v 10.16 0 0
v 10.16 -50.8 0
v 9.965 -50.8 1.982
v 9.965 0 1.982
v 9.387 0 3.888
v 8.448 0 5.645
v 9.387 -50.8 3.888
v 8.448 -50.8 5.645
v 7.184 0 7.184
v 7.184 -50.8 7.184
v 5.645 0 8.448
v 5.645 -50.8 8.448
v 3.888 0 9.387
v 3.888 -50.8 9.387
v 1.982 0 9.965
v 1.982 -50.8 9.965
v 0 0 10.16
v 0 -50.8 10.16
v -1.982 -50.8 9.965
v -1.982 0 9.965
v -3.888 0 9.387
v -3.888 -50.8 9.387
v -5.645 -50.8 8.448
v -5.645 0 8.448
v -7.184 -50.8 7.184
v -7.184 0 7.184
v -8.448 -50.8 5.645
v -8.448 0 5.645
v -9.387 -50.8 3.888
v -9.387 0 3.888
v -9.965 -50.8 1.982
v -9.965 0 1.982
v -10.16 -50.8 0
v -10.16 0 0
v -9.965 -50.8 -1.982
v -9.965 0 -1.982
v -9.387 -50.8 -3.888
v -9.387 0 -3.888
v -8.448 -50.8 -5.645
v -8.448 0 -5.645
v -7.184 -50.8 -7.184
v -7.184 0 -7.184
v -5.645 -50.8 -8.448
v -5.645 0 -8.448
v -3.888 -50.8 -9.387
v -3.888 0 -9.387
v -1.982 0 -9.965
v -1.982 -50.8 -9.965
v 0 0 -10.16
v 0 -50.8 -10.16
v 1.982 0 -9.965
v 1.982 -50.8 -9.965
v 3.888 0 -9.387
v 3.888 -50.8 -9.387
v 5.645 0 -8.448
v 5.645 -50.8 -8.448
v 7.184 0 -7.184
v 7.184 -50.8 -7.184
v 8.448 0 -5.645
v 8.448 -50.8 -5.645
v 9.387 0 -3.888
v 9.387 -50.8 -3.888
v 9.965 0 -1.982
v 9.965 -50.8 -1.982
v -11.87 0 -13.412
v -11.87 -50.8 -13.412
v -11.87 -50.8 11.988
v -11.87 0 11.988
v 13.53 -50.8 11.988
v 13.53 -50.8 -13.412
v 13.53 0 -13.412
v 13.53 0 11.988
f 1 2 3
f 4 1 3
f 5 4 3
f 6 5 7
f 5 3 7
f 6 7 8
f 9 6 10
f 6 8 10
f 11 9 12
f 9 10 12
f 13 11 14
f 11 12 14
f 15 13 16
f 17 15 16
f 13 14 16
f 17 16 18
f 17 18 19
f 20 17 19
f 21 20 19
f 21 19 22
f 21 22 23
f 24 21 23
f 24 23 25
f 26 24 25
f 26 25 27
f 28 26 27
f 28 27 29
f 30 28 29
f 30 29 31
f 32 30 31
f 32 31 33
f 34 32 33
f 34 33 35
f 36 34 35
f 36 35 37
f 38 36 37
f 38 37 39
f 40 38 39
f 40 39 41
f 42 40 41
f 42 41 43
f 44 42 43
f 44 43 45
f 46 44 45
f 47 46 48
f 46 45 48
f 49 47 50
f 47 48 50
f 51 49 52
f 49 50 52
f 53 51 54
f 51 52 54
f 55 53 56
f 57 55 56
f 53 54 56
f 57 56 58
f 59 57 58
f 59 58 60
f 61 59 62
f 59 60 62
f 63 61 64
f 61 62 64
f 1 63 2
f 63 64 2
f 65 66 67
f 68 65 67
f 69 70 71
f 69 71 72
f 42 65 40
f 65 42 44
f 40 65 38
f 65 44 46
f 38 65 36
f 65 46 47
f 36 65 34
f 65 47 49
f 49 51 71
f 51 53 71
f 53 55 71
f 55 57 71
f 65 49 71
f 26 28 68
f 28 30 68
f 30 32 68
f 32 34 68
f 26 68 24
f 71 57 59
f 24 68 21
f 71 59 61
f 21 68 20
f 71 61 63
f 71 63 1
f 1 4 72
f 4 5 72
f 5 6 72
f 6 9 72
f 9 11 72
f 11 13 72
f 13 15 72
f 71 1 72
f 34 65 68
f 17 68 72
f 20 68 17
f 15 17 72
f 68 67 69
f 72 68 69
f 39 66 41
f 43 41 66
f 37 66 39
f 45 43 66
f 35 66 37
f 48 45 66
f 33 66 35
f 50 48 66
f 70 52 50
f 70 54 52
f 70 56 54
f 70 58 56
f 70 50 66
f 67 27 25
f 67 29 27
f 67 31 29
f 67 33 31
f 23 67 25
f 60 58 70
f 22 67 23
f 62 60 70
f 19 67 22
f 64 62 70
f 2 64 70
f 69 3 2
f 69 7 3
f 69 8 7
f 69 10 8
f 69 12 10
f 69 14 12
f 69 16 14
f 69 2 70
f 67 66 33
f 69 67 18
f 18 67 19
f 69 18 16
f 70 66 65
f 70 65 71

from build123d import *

# Parameters (mm, degrees)
F0_W     = 25.4
F0_H     = 25.4
F1_DEPTH = 50.8
F2_R     = 10.16
F3_DEPTH = 50.801


with BuildPart() as f1:
    # F0 (on Front) → F1 (new body)
    with BuildSketch(Plane.XZ):
        with Locations((0.829598, -0.711867)):
            Rectangle(F0_W, F0_H)
    extrude(amount=F1_DEPTH)

    # F2 (on face) → F3 (cut, through all)
    with BuildSketch(Plane.XZ.offset(50.8)):
        Circle(F2_R)
    extrude(amount=-F3_DEPTH, mode=Mode.SUBTRACT)


solid = f1.part
